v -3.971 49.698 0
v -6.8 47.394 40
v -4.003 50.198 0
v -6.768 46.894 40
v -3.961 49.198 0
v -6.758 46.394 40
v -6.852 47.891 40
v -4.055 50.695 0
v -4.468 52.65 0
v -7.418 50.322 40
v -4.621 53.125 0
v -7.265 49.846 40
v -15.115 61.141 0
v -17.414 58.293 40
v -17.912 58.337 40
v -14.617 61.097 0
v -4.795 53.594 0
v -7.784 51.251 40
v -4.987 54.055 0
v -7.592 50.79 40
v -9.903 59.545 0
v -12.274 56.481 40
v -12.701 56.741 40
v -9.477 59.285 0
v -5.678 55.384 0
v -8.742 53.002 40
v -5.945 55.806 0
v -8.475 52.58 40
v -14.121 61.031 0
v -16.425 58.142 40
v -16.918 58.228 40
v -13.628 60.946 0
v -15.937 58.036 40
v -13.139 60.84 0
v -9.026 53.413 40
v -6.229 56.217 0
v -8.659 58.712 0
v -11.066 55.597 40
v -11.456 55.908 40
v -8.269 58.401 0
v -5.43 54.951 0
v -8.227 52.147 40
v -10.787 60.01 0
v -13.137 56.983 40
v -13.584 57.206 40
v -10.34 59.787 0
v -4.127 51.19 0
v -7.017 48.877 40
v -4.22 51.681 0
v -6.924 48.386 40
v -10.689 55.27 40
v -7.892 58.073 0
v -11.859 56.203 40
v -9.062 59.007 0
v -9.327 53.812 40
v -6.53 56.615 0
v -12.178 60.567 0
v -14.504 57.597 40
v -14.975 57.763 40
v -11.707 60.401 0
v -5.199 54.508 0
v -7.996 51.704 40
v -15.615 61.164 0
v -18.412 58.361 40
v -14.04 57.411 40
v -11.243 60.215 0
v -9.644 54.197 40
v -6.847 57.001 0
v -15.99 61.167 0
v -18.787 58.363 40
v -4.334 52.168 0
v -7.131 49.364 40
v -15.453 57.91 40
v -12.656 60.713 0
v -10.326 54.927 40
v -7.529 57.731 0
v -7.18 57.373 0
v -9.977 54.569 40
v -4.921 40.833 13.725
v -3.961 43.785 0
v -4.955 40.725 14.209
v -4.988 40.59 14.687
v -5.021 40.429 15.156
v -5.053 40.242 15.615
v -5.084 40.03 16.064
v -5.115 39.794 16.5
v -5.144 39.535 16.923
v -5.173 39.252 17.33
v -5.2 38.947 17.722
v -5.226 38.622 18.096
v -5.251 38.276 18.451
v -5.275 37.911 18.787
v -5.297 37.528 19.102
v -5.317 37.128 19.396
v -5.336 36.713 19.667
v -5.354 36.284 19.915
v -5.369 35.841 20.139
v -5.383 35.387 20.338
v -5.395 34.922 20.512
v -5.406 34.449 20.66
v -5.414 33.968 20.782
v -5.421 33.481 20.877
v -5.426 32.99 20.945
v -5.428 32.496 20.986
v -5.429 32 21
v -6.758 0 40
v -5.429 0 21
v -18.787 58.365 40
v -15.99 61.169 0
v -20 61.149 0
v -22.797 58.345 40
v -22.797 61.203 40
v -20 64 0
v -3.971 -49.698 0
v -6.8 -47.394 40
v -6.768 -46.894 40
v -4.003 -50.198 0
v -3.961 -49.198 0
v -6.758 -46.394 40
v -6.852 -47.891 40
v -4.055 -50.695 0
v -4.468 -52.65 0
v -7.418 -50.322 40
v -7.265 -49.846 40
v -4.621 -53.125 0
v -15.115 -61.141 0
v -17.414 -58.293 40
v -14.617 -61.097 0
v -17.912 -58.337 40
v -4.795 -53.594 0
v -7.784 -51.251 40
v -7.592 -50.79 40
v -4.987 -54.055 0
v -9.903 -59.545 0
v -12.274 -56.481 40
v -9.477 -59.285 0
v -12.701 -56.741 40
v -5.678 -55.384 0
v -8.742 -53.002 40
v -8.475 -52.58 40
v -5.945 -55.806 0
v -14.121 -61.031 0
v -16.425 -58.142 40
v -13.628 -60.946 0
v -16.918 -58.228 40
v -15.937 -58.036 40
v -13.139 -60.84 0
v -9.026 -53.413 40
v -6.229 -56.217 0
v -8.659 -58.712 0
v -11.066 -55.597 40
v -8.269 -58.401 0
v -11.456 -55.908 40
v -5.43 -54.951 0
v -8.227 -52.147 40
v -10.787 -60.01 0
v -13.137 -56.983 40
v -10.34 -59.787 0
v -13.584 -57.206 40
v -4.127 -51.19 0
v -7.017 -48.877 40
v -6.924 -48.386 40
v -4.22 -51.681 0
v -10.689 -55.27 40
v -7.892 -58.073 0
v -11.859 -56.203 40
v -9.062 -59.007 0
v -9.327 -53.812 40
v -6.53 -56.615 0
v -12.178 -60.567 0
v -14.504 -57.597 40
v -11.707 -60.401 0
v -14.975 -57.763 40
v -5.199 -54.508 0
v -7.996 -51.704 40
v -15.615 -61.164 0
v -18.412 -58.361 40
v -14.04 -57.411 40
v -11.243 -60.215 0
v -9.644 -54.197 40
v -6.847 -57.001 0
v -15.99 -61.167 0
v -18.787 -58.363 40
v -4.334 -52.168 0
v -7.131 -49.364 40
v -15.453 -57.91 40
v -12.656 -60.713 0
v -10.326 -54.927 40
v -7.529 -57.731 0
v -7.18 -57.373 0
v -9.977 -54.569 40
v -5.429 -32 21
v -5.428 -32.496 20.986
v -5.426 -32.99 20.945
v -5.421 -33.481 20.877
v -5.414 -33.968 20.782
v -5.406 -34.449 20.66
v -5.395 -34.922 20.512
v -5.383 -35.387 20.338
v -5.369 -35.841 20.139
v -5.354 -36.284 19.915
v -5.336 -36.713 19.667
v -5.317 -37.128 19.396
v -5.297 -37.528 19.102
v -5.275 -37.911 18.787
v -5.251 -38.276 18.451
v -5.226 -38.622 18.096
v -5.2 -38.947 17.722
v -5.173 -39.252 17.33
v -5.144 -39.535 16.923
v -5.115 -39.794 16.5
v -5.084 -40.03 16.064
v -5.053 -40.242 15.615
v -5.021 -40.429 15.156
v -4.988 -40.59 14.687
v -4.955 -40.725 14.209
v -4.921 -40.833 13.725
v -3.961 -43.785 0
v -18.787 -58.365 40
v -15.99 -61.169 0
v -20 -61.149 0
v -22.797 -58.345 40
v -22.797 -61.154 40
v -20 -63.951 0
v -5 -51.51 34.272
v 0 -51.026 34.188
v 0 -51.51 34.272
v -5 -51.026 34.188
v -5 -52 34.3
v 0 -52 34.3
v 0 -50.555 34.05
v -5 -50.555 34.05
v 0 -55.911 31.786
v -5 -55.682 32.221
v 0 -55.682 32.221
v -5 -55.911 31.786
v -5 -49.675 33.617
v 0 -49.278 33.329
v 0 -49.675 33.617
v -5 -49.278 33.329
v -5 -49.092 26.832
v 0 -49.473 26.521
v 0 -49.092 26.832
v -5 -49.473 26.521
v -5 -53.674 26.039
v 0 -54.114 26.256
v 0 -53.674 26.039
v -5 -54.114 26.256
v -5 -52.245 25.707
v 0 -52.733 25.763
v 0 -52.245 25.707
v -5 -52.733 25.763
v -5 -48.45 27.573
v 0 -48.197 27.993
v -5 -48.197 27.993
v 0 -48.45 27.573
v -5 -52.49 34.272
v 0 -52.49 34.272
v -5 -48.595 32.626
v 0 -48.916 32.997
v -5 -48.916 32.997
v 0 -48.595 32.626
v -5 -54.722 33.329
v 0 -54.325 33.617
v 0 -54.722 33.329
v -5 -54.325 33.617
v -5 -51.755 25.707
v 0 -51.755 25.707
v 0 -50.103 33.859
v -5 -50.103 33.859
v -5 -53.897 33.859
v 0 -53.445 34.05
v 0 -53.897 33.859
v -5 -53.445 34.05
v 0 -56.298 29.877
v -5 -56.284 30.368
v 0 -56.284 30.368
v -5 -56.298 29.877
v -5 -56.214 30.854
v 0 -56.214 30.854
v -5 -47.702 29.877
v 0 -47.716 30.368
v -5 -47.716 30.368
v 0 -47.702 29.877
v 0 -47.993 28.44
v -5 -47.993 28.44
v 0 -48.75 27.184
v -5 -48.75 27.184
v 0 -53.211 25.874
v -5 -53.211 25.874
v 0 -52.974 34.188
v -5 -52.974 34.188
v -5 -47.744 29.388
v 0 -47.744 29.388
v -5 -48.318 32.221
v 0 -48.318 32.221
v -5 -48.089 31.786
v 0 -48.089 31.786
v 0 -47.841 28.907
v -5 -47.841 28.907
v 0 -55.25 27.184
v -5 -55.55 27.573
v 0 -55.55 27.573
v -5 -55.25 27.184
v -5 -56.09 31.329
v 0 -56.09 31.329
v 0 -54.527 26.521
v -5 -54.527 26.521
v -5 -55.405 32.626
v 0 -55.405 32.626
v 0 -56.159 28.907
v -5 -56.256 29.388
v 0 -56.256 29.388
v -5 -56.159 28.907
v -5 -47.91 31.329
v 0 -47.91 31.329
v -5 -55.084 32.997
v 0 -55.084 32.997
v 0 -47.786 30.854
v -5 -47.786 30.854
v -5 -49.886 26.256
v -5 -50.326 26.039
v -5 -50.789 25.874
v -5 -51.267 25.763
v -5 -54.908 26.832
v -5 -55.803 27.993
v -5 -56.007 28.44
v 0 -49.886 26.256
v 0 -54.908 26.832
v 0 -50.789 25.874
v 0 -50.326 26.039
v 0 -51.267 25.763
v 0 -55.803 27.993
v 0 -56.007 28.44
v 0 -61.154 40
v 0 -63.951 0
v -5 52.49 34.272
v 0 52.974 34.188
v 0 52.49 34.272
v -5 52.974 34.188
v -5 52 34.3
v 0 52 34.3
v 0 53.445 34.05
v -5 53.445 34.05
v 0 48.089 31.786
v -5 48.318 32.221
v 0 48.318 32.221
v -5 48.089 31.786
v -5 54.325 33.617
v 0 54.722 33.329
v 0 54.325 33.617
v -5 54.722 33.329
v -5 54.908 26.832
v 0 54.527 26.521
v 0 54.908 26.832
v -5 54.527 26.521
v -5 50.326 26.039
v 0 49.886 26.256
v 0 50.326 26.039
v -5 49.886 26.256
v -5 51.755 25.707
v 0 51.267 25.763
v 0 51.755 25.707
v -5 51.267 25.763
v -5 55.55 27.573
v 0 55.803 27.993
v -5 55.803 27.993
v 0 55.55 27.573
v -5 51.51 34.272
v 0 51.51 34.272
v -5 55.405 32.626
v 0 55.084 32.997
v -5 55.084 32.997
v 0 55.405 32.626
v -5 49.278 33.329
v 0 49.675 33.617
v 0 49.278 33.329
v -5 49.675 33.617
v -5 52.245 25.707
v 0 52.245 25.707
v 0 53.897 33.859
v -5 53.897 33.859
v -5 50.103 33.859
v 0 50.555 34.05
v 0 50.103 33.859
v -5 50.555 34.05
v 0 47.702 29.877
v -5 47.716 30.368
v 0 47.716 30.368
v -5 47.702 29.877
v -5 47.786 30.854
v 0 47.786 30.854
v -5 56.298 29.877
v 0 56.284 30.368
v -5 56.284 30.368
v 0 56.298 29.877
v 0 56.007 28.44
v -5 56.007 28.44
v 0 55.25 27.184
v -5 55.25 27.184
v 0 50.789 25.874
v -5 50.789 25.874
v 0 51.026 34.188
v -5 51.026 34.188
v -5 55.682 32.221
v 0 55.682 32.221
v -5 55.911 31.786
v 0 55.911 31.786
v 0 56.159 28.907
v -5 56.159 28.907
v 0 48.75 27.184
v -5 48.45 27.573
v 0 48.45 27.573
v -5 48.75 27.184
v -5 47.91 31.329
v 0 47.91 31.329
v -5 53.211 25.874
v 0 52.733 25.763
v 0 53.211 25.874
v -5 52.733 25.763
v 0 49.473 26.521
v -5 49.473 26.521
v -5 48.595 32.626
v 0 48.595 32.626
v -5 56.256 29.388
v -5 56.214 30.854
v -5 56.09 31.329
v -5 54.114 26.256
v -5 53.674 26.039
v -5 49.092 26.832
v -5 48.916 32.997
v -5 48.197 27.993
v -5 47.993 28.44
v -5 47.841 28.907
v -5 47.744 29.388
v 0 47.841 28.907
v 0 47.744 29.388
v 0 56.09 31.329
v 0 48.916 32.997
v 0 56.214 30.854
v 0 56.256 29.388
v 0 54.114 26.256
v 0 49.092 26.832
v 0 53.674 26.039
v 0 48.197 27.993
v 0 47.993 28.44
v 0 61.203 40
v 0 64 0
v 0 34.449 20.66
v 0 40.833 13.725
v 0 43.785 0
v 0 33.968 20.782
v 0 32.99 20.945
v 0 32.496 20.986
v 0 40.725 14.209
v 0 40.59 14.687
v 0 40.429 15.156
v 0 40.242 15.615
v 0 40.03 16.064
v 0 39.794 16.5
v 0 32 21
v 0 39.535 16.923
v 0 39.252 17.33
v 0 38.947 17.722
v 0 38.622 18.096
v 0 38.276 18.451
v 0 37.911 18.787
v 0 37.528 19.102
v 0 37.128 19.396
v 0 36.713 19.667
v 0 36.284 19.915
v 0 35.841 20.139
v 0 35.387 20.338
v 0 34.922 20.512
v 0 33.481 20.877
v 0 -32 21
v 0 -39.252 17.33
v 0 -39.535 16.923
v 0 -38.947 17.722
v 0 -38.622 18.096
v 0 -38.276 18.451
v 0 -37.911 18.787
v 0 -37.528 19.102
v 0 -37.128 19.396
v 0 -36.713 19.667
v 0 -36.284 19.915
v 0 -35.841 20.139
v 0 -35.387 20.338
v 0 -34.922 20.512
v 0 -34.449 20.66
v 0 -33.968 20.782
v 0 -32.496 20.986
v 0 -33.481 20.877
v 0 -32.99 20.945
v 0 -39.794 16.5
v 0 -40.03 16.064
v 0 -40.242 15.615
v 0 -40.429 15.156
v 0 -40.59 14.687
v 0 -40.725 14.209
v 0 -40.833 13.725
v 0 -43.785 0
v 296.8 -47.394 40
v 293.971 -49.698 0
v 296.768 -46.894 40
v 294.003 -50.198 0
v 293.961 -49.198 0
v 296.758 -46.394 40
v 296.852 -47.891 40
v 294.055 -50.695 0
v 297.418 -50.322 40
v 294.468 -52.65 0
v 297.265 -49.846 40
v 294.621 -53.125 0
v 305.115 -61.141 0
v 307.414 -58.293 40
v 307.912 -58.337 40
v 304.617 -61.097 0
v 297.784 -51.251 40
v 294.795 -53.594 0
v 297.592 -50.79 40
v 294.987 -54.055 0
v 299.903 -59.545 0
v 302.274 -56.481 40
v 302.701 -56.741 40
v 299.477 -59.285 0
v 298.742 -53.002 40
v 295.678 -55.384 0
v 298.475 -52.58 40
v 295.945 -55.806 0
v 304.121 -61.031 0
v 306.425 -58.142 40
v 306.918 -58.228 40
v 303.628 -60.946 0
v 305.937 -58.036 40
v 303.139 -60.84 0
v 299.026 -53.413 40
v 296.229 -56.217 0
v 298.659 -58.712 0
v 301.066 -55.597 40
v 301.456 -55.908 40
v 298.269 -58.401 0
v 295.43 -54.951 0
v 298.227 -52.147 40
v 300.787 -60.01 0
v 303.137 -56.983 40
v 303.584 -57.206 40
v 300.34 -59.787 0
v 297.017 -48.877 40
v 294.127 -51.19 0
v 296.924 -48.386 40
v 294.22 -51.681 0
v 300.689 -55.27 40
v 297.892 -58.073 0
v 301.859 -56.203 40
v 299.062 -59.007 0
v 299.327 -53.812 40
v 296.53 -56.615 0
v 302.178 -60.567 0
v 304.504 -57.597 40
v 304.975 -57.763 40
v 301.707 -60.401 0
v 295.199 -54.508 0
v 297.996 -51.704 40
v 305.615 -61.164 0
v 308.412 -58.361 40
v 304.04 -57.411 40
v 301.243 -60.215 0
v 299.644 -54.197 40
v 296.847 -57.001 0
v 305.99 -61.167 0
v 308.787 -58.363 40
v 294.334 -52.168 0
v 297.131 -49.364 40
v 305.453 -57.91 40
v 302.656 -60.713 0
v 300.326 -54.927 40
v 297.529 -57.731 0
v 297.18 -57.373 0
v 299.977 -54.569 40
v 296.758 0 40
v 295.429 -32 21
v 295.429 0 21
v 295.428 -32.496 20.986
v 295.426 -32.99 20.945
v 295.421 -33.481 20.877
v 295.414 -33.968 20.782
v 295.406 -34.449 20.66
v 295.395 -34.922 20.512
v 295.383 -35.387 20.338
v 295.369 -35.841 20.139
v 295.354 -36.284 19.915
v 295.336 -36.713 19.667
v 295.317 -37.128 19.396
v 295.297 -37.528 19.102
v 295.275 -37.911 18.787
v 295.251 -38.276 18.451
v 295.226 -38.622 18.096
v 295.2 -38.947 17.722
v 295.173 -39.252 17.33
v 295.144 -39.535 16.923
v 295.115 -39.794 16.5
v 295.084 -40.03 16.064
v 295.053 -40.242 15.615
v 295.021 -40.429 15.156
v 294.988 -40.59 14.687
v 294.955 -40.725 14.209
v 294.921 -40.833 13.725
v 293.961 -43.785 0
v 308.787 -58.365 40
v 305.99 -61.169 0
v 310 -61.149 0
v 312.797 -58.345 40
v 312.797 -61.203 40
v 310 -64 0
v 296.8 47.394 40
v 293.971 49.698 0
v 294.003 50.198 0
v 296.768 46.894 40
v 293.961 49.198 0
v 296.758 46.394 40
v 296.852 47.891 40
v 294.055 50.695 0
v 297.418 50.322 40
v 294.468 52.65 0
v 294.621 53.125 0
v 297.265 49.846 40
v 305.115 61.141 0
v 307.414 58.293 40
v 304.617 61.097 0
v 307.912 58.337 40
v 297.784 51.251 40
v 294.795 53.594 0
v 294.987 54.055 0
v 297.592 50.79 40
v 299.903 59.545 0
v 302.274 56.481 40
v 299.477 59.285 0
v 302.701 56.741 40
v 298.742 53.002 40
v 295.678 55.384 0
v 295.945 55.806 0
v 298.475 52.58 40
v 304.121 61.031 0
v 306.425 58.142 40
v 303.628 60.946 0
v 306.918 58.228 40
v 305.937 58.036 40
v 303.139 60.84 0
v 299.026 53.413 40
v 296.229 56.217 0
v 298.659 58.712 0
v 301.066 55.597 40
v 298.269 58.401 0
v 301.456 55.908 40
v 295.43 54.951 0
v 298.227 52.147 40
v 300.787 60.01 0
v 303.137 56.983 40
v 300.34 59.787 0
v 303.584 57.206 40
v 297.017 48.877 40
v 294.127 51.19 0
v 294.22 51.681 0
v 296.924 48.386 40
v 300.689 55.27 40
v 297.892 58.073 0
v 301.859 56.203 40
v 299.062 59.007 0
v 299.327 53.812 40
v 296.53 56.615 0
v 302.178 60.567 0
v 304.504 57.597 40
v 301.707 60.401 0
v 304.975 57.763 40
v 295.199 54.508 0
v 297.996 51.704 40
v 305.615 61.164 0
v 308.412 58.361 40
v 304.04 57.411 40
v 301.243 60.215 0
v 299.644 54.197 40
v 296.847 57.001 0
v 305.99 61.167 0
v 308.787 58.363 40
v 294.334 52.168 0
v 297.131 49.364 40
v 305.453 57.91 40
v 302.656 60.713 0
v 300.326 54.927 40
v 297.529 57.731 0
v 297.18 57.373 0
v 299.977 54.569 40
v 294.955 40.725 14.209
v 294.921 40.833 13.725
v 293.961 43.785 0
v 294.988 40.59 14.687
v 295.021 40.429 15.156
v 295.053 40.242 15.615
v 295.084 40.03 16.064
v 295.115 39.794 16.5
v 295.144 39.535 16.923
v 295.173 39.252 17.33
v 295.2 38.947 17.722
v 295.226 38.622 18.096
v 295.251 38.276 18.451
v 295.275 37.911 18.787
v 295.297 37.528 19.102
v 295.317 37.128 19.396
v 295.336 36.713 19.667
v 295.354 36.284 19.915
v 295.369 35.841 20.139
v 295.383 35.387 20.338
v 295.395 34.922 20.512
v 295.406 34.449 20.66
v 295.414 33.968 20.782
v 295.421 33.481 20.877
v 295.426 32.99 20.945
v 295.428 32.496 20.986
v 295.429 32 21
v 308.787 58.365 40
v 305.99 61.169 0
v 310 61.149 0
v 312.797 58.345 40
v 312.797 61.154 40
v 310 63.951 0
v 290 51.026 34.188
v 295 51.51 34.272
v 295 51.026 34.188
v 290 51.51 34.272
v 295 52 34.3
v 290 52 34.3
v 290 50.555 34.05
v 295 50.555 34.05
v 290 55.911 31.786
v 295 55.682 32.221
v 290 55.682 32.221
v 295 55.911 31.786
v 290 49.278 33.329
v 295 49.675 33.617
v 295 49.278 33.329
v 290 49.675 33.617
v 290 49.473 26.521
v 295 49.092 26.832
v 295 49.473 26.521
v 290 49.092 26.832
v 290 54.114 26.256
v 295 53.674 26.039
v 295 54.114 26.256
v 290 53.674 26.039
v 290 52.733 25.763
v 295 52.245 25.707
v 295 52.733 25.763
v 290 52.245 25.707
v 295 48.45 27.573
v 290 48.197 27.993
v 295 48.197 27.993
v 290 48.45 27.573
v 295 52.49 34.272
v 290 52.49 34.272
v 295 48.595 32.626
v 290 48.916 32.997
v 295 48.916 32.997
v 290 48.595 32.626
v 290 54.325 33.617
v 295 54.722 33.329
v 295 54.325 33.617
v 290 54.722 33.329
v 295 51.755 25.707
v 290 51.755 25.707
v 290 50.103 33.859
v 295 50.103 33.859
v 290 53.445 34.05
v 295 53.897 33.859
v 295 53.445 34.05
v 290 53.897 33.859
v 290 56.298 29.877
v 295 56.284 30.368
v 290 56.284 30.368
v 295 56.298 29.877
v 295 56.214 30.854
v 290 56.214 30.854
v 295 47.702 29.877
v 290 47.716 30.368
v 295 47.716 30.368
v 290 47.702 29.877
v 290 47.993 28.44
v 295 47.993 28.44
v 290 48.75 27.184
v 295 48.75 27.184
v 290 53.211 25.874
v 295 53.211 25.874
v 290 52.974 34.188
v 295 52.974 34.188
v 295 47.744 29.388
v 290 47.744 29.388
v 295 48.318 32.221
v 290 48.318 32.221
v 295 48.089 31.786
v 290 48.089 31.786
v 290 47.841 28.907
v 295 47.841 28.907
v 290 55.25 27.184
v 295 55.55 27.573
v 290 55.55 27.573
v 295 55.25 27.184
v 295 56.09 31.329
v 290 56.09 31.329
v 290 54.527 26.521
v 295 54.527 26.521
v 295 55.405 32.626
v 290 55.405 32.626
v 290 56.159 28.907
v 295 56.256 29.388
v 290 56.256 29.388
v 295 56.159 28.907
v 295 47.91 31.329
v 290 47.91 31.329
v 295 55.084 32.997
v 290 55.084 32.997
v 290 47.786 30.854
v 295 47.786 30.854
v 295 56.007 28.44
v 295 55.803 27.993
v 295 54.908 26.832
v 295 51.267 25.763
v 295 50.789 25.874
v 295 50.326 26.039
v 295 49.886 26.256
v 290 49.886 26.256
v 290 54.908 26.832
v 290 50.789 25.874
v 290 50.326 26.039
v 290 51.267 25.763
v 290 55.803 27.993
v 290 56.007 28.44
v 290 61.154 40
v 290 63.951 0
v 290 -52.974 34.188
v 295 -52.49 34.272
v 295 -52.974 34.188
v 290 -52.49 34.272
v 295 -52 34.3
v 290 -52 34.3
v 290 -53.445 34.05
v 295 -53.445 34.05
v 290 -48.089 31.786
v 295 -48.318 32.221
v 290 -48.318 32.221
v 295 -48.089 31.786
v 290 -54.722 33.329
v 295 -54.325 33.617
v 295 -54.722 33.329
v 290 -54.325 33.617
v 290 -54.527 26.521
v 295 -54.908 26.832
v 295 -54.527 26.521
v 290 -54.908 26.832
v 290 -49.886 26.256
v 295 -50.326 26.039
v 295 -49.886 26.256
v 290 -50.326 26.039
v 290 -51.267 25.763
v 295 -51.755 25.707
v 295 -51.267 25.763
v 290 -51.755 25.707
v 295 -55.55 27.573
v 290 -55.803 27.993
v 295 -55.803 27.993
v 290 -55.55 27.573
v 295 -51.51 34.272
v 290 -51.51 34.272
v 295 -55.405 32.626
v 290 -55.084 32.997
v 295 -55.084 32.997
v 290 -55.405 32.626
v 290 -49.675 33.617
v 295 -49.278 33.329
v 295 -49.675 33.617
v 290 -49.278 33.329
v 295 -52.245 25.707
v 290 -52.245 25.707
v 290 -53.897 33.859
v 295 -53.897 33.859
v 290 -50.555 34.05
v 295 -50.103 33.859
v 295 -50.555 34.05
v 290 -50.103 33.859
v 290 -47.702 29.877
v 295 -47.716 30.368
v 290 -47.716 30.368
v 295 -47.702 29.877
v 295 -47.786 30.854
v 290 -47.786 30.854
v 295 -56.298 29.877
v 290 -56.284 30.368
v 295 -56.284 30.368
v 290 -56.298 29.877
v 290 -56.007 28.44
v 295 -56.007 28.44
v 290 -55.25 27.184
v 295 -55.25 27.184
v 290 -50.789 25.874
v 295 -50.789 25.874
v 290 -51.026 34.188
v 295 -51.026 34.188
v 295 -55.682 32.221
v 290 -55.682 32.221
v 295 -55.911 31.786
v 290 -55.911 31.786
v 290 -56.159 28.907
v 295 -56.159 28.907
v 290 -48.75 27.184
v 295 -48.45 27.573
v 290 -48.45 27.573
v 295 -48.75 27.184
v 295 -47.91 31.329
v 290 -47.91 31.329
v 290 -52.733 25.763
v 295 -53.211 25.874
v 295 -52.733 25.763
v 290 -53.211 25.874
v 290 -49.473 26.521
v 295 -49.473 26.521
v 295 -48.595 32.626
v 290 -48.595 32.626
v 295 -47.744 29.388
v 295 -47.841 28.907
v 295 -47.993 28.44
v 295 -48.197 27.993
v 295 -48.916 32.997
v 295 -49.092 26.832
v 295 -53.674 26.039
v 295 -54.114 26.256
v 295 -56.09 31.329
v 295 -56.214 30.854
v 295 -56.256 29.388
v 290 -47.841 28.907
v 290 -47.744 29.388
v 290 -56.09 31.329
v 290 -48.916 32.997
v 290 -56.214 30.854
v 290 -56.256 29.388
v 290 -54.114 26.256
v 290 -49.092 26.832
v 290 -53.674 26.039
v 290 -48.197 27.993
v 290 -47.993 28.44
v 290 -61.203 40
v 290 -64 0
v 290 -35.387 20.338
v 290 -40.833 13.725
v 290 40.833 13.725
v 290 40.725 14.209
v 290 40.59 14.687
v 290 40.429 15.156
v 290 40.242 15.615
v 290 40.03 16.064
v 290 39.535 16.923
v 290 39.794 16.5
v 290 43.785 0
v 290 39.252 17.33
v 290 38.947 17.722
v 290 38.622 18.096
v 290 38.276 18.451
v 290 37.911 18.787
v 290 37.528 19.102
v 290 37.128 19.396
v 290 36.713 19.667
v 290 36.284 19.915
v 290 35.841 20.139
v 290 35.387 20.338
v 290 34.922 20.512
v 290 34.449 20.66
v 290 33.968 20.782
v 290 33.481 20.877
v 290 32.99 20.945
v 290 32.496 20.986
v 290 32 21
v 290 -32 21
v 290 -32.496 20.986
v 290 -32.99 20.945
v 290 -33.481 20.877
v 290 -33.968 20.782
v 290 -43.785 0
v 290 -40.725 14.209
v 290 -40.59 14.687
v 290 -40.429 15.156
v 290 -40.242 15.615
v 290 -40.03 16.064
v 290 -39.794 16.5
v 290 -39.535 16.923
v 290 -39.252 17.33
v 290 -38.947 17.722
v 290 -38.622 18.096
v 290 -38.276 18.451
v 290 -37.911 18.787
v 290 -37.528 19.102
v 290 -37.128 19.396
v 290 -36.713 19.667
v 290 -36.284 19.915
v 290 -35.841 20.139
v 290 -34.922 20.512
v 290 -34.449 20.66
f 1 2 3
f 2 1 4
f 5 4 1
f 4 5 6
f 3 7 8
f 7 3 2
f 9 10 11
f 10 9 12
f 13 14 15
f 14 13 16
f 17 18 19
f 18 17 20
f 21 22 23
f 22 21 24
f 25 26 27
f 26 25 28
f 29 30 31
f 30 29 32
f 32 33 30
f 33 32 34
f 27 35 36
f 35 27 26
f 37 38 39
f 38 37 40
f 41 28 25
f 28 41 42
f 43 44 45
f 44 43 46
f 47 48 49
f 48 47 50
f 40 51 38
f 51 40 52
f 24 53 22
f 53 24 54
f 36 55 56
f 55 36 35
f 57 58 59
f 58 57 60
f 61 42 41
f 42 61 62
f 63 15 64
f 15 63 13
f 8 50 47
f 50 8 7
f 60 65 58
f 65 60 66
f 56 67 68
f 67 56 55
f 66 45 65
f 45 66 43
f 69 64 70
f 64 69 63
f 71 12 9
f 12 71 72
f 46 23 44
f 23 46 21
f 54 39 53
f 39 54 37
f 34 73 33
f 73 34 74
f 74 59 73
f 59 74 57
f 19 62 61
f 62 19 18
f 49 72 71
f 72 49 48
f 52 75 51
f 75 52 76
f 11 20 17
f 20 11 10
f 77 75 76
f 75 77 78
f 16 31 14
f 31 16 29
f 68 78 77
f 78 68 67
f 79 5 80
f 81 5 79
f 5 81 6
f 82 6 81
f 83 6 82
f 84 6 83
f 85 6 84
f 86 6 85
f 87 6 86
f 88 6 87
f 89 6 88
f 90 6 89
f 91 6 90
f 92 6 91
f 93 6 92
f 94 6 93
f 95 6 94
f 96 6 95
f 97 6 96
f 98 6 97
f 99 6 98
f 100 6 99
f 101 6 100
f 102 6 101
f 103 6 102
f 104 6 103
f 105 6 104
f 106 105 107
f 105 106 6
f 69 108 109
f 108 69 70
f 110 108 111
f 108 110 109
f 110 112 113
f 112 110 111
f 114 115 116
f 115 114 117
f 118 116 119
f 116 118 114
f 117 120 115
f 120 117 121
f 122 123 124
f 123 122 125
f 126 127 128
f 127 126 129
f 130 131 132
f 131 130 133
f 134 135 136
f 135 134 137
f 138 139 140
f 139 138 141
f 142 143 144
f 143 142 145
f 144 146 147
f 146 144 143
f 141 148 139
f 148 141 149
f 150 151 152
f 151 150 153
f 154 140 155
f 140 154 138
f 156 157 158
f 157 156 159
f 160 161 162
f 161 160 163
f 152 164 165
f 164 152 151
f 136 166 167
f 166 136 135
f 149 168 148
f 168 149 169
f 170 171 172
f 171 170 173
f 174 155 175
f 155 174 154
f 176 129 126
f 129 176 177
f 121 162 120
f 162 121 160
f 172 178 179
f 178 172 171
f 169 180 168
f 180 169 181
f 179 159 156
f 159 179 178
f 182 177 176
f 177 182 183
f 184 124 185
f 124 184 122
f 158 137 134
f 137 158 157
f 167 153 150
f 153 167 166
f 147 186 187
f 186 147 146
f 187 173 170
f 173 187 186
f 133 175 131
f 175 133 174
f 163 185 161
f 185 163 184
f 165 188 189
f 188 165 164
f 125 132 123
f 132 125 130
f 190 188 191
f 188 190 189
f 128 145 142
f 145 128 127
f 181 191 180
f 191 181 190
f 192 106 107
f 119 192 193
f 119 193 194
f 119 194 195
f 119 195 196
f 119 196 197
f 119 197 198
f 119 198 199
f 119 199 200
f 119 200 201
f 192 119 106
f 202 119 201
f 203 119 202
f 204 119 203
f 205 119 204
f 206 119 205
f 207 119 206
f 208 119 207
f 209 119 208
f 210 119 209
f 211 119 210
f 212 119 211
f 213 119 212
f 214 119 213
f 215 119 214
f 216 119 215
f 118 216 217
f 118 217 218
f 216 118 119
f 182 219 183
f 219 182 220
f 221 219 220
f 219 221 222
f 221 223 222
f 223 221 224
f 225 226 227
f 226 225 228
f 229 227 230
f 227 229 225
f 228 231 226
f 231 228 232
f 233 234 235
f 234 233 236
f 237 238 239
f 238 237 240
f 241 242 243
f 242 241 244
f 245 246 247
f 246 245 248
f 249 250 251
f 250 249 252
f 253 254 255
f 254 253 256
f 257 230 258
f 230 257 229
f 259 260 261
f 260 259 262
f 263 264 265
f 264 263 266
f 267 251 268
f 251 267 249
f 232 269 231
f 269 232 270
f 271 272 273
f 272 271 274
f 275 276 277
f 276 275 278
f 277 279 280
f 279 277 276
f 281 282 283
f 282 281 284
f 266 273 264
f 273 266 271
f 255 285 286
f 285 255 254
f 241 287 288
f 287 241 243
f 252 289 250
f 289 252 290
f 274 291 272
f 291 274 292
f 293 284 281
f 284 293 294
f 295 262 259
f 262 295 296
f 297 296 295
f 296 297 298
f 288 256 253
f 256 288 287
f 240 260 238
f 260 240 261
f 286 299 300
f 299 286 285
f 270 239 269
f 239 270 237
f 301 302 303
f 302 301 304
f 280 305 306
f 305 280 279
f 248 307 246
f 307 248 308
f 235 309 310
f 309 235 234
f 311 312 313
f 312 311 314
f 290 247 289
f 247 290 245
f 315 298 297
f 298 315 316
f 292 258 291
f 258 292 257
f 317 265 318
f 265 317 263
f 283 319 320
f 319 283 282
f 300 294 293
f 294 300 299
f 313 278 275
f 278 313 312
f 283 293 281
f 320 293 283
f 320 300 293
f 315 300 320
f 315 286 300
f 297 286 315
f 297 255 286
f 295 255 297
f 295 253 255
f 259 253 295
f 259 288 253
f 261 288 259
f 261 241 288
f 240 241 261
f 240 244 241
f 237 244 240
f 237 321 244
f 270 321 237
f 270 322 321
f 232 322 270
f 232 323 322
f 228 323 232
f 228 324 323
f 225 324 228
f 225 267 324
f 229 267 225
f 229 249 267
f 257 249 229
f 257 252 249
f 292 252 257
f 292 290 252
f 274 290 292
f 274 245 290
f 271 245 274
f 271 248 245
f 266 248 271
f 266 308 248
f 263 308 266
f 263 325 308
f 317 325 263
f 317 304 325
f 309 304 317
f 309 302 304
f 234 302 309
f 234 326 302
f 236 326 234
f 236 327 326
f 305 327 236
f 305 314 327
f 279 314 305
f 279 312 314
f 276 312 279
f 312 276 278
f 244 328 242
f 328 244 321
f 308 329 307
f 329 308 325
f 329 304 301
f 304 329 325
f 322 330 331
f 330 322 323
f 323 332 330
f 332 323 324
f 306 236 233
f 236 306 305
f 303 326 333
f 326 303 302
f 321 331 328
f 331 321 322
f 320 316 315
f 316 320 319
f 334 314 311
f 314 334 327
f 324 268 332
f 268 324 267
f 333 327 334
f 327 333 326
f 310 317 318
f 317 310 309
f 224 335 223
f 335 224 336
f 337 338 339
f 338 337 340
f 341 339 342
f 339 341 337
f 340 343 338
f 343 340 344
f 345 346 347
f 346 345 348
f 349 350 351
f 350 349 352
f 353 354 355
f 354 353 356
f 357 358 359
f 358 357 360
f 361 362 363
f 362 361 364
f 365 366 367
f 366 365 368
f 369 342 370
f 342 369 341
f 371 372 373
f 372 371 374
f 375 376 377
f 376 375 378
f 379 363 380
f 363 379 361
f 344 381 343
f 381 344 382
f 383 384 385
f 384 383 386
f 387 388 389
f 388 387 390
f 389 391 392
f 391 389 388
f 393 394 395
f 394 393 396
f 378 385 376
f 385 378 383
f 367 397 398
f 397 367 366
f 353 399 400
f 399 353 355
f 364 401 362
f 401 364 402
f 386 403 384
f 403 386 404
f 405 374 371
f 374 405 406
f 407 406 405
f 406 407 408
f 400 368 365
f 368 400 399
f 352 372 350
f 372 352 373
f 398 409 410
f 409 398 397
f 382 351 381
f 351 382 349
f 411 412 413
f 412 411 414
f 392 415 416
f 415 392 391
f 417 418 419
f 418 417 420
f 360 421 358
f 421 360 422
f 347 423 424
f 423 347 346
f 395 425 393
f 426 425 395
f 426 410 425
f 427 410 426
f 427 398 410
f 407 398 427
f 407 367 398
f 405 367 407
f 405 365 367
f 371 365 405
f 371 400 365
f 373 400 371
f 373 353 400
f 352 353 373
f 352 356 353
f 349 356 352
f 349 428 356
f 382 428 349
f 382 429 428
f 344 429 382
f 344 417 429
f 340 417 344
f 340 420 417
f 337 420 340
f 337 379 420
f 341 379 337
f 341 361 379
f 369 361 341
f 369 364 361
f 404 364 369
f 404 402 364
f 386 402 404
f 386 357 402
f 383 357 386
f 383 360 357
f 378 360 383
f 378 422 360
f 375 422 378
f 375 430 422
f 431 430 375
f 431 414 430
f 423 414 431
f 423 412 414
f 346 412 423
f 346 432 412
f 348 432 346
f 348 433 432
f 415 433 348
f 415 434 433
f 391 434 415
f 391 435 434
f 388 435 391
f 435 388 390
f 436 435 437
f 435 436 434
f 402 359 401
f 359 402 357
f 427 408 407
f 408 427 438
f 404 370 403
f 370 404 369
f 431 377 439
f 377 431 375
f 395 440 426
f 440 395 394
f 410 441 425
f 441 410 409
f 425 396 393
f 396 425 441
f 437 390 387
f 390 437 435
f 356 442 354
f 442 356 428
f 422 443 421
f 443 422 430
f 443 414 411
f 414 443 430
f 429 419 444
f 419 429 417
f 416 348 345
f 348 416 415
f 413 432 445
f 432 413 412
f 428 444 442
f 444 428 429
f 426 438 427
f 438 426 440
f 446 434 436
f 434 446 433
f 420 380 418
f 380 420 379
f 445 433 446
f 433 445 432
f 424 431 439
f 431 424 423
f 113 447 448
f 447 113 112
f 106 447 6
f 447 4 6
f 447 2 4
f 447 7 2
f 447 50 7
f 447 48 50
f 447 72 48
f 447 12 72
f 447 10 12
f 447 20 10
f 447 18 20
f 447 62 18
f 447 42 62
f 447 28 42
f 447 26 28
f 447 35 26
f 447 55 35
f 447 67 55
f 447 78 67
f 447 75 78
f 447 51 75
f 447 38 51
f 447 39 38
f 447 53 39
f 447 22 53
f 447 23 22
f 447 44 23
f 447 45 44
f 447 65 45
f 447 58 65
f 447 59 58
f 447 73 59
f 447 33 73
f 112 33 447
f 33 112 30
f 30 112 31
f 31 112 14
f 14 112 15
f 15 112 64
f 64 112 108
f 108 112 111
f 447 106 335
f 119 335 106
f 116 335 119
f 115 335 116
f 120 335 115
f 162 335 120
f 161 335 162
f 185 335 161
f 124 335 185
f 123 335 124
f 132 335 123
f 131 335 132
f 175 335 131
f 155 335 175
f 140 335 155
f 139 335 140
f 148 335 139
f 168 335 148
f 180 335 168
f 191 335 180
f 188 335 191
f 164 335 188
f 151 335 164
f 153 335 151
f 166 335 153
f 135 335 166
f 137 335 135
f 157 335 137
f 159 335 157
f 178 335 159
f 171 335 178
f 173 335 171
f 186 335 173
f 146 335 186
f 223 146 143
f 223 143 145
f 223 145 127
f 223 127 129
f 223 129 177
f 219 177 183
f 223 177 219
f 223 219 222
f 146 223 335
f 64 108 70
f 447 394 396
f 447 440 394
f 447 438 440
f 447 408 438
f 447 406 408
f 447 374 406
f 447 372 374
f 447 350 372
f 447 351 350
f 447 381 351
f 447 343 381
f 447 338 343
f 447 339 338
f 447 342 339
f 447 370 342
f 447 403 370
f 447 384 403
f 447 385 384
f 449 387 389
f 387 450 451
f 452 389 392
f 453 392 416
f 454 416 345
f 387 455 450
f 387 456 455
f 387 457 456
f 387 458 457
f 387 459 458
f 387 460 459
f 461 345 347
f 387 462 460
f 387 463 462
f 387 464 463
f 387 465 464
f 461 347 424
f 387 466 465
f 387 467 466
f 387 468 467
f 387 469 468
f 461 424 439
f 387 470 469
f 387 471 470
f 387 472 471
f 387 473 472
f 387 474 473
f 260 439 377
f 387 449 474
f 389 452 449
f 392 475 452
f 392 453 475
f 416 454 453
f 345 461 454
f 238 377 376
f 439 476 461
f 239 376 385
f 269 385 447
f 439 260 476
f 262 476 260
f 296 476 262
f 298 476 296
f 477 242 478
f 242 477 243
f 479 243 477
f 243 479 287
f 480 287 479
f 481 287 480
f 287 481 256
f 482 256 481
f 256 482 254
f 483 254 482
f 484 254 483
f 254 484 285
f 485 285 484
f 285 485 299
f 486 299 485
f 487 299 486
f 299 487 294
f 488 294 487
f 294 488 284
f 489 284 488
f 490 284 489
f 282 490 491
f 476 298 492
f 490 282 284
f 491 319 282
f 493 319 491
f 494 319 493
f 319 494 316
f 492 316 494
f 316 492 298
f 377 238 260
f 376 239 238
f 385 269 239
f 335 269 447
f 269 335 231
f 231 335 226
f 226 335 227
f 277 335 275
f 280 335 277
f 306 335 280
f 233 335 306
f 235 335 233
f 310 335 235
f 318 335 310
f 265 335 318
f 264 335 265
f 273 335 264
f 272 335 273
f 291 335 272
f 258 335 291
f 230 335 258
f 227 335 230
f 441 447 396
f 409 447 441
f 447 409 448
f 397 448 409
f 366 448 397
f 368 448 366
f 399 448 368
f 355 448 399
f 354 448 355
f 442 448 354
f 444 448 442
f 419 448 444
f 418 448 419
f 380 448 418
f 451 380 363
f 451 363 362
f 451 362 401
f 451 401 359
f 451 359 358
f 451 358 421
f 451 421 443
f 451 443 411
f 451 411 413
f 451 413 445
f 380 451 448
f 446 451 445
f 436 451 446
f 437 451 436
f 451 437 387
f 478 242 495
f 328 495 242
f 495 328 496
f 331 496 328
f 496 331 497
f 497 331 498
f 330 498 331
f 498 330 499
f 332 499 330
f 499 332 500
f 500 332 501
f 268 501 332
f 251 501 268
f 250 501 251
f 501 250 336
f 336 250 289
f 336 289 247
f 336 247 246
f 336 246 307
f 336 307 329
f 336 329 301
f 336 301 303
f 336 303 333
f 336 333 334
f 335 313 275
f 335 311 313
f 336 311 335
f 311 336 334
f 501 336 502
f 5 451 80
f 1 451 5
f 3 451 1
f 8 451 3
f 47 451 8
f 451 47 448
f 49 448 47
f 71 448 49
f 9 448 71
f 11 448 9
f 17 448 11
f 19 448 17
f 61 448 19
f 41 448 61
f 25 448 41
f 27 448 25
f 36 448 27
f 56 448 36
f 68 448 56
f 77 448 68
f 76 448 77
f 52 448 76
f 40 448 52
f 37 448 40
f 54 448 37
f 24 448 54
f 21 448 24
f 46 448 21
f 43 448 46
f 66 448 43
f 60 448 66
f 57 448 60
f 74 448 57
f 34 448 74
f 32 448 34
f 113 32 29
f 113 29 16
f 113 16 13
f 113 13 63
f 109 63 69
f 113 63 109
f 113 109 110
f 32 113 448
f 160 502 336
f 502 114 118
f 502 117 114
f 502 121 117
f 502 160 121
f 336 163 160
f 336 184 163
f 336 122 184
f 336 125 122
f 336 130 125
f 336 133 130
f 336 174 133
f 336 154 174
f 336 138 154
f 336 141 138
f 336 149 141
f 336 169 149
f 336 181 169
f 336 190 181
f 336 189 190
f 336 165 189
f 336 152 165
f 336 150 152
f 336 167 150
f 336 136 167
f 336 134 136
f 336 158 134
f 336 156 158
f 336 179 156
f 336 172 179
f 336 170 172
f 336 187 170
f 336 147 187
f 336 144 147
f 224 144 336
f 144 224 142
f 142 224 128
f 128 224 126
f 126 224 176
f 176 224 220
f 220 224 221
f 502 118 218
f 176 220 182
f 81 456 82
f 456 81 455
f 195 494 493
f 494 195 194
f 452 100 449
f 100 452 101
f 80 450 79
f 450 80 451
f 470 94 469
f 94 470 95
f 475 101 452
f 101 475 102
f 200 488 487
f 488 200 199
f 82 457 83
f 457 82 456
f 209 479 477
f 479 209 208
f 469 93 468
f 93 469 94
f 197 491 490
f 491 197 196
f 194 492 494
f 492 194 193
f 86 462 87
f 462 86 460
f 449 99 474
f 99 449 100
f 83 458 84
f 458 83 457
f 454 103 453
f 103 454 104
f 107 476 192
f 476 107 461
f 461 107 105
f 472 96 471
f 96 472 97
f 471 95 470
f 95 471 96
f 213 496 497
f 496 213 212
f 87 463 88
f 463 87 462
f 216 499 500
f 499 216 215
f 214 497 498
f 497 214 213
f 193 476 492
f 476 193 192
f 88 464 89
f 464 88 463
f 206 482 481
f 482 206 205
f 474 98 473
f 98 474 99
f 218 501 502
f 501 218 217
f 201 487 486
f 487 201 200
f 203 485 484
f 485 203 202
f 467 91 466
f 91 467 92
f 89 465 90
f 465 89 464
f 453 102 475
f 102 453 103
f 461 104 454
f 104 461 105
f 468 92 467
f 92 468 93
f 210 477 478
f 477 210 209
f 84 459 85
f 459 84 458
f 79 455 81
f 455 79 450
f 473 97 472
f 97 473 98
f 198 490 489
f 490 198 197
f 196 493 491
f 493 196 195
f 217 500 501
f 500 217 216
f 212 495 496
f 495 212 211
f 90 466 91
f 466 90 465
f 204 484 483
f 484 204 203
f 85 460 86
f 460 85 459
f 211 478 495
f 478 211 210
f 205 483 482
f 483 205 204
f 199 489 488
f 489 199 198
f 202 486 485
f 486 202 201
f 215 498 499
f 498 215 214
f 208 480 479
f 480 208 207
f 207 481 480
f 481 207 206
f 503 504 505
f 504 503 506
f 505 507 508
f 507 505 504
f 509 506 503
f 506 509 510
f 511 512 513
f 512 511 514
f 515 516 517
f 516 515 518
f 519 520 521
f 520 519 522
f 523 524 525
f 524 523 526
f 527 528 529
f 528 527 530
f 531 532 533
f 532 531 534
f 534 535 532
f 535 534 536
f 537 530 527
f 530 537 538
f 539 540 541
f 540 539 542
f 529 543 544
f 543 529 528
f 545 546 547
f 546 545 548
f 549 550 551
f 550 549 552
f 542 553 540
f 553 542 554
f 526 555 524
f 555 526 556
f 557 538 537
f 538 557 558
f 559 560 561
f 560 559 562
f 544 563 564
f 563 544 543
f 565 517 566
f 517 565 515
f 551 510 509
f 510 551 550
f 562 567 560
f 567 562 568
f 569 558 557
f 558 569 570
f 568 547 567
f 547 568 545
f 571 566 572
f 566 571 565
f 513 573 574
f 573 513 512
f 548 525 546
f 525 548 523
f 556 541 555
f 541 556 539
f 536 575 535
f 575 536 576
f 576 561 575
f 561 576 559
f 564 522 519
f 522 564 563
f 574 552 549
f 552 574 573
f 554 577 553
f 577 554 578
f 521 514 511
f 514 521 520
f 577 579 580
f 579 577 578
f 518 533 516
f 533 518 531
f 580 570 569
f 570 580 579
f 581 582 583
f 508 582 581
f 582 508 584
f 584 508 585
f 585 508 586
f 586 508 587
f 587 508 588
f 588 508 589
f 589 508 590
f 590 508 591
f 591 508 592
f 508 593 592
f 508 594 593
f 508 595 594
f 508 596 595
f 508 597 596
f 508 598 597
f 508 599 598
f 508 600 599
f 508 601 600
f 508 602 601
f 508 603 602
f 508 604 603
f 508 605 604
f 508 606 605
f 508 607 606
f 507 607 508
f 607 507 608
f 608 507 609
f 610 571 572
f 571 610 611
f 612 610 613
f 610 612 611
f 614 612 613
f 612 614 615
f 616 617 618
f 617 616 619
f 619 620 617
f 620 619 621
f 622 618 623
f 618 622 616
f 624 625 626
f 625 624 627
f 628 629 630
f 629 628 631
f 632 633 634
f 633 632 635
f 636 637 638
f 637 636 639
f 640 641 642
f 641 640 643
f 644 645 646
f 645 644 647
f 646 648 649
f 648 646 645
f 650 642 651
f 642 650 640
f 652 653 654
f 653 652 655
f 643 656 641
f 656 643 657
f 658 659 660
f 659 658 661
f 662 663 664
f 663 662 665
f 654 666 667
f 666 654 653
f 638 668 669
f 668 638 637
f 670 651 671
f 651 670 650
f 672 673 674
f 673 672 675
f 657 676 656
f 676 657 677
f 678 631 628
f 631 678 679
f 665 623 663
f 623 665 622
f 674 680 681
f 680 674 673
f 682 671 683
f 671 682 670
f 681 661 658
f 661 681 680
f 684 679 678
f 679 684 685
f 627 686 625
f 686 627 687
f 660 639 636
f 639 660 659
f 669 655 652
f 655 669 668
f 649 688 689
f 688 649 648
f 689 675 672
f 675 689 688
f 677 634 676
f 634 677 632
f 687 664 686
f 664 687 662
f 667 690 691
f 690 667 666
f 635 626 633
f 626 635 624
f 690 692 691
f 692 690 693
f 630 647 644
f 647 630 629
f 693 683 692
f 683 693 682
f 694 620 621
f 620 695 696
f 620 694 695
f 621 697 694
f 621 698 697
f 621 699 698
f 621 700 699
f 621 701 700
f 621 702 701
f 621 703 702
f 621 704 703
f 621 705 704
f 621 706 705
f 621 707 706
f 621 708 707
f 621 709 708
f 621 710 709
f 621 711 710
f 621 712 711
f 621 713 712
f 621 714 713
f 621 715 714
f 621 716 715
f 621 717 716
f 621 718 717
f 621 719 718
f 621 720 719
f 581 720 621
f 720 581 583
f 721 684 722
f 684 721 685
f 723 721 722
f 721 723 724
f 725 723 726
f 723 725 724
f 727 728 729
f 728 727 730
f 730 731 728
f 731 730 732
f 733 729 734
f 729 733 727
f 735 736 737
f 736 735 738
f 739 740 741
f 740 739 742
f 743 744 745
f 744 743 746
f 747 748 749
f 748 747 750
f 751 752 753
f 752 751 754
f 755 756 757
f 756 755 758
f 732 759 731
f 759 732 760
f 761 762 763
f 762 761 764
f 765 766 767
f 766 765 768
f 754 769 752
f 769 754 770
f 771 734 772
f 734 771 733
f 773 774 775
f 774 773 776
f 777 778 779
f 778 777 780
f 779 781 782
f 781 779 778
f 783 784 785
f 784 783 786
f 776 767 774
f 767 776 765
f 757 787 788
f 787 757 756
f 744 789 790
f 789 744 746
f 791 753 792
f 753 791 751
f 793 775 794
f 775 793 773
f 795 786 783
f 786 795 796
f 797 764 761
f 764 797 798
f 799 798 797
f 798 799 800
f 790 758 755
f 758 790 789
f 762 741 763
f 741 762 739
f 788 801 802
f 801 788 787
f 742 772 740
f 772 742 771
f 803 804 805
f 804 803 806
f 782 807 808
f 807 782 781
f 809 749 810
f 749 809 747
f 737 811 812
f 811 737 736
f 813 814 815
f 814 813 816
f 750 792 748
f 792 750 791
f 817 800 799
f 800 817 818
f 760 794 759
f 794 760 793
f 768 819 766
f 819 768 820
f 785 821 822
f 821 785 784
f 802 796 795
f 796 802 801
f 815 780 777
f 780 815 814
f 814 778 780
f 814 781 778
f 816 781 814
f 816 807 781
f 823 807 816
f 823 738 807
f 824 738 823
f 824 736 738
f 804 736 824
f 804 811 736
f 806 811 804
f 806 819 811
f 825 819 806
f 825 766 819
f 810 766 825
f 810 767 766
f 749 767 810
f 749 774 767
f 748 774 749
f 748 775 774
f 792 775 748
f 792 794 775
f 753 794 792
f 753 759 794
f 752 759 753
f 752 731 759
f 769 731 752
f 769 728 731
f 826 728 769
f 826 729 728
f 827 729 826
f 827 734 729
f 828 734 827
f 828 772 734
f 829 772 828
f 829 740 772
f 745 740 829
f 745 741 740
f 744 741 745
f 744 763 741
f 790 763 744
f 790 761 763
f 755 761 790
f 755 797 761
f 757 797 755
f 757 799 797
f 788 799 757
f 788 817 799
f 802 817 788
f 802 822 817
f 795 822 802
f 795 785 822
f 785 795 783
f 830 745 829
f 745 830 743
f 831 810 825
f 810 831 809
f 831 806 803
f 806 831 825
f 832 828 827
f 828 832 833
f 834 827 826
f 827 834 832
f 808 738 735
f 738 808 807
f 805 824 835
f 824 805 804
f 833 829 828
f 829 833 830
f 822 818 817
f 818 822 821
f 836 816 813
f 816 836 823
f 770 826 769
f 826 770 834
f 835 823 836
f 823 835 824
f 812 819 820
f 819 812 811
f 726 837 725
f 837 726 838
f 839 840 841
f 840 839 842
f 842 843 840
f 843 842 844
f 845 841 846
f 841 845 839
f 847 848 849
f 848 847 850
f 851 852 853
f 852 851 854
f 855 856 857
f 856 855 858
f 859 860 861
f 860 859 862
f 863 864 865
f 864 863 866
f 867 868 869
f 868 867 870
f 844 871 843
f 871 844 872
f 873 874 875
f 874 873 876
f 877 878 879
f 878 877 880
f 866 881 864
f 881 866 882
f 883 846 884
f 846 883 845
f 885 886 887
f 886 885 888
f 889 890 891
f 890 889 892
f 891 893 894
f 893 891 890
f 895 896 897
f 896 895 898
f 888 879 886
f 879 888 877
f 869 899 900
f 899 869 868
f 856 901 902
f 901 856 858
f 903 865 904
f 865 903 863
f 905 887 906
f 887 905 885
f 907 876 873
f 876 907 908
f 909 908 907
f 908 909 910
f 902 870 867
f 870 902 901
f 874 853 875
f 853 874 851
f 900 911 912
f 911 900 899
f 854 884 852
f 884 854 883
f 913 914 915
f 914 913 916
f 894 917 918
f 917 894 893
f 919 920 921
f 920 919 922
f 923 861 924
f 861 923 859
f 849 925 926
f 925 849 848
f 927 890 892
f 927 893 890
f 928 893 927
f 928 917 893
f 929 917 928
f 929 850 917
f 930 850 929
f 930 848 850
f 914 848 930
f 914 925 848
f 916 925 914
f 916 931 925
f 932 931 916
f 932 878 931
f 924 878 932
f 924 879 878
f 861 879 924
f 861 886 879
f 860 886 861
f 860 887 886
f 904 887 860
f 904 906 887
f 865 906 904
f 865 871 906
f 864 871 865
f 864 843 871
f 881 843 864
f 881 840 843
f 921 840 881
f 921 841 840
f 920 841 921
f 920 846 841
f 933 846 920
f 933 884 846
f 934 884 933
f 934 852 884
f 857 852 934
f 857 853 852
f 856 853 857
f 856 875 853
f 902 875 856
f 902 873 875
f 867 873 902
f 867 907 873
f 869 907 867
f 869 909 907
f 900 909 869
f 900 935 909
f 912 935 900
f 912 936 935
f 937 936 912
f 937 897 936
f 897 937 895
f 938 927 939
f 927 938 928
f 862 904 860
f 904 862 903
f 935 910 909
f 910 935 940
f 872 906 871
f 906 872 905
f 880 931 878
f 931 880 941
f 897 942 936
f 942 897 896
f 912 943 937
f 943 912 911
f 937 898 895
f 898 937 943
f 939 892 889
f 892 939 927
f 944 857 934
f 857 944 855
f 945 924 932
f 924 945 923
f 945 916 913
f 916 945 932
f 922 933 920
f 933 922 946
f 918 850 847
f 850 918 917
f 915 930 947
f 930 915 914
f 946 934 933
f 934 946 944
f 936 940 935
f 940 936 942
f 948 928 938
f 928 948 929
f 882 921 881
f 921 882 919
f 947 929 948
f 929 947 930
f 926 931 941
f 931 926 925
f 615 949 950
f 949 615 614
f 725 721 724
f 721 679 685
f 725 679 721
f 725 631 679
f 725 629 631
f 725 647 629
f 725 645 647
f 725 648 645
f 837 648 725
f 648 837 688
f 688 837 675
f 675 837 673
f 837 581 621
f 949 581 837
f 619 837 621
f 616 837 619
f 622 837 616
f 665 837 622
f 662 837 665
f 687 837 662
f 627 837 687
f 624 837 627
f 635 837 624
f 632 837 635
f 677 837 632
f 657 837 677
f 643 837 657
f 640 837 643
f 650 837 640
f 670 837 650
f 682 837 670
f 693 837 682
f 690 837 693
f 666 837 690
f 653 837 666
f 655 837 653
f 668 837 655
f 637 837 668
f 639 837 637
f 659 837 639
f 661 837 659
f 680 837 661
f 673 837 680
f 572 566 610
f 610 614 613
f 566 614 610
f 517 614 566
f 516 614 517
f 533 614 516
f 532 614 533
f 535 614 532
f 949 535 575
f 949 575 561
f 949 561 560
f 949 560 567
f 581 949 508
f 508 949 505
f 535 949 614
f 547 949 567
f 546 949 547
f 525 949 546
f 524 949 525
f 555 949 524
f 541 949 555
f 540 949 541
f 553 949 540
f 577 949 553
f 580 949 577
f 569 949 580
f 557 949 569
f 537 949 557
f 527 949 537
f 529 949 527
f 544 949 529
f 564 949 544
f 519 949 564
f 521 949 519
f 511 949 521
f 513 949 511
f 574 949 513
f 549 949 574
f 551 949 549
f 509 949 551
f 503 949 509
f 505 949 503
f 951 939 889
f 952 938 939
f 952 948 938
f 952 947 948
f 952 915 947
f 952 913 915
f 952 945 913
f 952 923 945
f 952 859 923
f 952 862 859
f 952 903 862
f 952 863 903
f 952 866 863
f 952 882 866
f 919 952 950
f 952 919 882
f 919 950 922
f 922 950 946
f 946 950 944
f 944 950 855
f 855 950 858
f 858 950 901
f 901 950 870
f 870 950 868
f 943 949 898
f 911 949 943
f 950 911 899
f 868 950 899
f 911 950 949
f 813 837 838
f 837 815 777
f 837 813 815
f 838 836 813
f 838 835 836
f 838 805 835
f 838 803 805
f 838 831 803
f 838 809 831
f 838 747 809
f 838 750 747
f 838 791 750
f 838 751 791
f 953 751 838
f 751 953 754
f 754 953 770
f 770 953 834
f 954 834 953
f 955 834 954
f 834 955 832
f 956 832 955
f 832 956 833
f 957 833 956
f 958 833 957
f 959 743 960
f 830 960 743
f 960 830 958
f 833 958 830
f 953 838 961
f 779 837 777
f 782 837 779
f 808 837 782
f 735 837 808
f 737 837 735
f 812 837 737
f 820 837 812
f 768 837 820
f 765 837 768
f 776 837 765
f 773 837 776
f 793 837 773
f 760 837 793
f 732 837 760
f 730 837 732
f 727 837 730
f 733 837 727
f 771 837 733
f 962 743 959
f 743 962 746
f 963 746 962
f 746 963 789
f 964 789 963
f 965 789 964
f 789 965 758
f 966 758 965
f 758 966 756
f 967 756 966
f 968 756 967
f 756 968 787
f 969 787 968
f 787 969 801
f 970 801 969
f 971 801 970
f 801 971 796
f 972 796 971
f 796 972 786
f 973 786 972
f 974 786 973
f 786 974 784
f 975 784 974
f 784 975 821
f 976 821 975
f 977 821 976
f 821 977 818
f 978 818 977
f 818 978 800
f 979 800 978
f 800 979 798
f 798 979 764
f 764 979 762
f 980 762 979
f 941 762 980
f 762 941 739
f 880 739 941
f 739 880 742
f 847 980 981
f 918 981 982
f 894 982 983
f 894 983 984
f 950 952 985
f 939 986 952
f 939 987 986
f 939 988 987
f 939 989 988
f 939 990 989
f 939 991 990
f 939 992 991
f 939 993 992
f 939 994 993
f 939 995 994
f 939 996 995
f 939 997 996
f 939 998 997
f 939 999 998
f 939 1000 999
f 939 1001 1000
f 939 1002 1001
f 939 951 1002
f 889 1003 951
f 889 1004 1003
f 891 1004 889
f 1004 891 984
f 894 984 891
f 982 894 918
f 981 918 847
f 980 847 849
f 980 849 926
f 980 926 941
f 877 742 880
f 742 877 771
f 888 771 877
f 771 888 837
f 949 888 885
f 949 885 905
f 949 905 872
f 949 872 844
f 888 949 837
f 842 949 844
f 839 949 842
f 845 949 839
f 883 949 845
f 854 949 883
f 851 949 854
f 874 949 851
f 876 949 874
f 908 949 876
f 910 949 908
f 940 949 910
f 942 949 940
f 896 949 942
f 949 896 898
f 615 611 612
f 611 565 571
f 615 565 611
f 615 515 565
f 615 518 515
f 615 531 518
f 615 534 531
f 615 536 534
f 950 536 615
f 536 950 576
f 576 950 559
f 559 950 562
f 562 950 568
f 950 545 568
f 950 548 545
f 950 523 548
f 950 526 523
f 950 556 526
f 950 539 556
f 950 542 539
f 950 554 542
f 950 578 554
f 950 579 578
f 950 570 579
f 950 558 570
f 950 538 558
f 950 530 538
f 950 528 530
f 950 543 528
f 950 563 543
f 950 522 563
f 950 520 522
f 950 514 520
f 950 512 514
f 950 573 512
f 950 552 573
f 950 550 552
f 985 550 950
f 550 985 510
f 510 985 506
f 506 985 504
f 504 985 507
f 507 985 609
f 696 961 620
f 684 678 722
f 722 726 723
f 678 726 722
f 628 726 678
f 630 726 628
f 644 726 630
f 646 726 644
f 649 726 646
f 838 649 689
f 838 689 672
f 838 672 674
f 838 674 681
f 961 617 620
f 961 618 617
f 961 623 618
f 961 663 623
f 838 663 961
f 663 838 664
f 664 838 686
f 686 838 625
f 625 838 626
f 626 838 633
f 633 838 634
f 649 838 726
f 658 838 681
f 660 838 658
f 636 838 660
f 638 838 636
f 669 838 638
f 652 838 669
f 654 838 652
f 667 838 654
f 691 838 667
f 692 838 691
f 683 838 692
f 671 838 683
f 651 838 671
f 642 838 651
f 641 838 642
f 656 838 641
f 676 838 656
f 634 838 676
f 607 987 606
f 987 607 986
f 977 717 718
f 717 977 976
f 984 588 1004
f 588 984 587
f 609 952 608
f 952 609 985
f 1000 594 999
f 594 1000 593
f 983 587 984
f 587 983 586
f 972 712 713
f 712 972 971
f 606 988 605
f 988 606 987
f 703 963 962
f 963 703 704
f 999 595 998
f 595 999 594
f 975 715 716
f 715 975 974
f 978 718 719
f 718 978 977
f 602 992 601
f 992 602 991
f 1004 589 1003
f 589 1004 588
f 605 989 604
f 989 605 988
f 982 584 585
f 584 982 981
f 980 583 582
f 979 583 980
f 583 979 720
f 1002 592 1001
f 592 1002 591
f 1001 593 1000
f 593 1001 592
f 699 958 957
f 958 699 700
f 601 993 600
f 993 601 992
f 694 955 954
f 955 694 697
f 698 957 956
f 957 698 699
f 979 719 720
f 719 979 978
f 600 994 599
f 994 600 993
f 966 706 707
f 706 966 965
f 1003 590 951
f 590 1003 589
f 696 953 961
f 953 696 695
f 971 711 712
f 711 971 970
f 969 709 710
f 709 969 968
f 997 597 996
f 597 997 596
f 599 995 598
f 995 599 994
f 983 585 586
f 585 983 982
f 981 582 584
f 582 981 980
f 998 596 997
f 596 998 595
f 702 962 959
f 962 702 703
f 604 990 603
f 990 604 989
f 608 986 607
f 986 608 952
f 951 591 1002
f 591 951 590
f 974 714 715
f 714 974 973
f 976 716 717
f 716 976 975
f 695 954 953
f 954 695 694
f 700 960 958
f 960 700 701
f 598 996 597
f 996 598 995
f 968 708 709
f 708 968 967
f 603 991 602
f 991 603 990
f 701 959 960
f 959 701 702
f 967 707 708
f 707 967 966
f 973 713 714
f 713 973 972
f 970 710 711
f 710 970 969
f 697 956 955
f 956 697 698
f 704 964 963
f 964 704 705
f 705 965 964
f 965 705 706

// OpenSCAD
// -------------------------------------------------------------------------------------------------

// Filament Storage, Quick Change - with two 8mm steel rods in Ikea Samla box
// © anton@cking.be
//   https://www.youmagine.com/users/ant0ni0
//   https://www.thingiverse.com/ant0ni0

// GLOBAL PARAMETERS -------------------------------------------------------------------------------

/* [Dimensions] */

rd = 8.0;  // rod diameter
ss = 0.6;  // support slack
rs = 1.2;  // roller slack
gd = 2.2;  // groove depth
sw = 1.3;  // side width
gw = 4.0;  // groove width

od = 22.0; // overall diameter

/* [Hidden] */

$fa = 0.5; // minimum facet angle
$fs = 0.5; // minimum facet size

// BUILD -------------------------------------------------------------------------------------------

display();
//roller();
//2rollers();
//4rollers();
//support();

// MODULES -----------------------------------------------------------------------------------------

module display()
{
    for (f=[0,1])
        translate([f*290,0,0]) rotate([0,-90,f*180]) support();
    
    for (y=[-52,52])
        translate([-5,y,30]) rotate([0,90,0]) %cylinder(d=rd,h=300);
    
    // TODO add some rollers
}

module roller()
{
    difference()
    {
        union()
        {
            cylinder(d=od,h=sw);
            translate([0,0,sw]) cylinder(d1=od,d2=od-2*gd,h=gd);
            translate([0,0,sw+gd]) cylinder(d=od-2*gd,h=gw);
            translate([0,0,sw+gd+gw]) cylinder(d1=od-2*gd,d2=od,h=gd);
            translate([0,0,sw+2*gd+gw]) cylinder(d=od,h=sw);
        }
        
        translate([0,0,-1]) cylinder(d=rd+rs,h=99);
    }
}

module 2rollers()
{
    for (x=[0,od+2])
        translate([x,0,0]) roller();
}

module 4rollers()
{
    for (x=[0,od+2])
        for (y=[0,od+2])
            translate([x,y,0]) roller();
}

module support()
{
    difference()
    {
        translate([0,-64,0]) cube([40,128,40]);

        for (m=[0,1])
        {
            mirror([0,m,0])
            {
                translate([0,0,20]) rotate([4,86,0]) translate([4,0,-10])
                union()
                {
                    translate([0,49,0]) cylinder(d=24,h=80);
                    translate([-12,-10,0]) cube([24,59,80]);
                    translate([-12,49]) cube([12,12,80]);
                    translate([-24,0,0]) cube([20,80,80]);
                    //translate([-4,61,0]) rotate([0,0,45]) translate([-0.6,-0.6,0]) cube([1.2,1.2,80]);
                }
            }
        }
        
        for (f=[-1,1])
        {
            translate([30,f*52,-1]) cylinder(d=rd+ss,h=6);
            translate([0,f*74-10,0]) rotate([0,0,-f*4]) translate([-10,0,-1]) cube([60,20,30]);
        }

        hull()
        {
            for (y=[-32,32])
                translate([12,y,-1]) cylinder(d=18,h=10);
            translate([-2,-44,-1]) cube([1,88,10]);
        }
    }
}

// -------------------------------------------------------------------------------------------------
